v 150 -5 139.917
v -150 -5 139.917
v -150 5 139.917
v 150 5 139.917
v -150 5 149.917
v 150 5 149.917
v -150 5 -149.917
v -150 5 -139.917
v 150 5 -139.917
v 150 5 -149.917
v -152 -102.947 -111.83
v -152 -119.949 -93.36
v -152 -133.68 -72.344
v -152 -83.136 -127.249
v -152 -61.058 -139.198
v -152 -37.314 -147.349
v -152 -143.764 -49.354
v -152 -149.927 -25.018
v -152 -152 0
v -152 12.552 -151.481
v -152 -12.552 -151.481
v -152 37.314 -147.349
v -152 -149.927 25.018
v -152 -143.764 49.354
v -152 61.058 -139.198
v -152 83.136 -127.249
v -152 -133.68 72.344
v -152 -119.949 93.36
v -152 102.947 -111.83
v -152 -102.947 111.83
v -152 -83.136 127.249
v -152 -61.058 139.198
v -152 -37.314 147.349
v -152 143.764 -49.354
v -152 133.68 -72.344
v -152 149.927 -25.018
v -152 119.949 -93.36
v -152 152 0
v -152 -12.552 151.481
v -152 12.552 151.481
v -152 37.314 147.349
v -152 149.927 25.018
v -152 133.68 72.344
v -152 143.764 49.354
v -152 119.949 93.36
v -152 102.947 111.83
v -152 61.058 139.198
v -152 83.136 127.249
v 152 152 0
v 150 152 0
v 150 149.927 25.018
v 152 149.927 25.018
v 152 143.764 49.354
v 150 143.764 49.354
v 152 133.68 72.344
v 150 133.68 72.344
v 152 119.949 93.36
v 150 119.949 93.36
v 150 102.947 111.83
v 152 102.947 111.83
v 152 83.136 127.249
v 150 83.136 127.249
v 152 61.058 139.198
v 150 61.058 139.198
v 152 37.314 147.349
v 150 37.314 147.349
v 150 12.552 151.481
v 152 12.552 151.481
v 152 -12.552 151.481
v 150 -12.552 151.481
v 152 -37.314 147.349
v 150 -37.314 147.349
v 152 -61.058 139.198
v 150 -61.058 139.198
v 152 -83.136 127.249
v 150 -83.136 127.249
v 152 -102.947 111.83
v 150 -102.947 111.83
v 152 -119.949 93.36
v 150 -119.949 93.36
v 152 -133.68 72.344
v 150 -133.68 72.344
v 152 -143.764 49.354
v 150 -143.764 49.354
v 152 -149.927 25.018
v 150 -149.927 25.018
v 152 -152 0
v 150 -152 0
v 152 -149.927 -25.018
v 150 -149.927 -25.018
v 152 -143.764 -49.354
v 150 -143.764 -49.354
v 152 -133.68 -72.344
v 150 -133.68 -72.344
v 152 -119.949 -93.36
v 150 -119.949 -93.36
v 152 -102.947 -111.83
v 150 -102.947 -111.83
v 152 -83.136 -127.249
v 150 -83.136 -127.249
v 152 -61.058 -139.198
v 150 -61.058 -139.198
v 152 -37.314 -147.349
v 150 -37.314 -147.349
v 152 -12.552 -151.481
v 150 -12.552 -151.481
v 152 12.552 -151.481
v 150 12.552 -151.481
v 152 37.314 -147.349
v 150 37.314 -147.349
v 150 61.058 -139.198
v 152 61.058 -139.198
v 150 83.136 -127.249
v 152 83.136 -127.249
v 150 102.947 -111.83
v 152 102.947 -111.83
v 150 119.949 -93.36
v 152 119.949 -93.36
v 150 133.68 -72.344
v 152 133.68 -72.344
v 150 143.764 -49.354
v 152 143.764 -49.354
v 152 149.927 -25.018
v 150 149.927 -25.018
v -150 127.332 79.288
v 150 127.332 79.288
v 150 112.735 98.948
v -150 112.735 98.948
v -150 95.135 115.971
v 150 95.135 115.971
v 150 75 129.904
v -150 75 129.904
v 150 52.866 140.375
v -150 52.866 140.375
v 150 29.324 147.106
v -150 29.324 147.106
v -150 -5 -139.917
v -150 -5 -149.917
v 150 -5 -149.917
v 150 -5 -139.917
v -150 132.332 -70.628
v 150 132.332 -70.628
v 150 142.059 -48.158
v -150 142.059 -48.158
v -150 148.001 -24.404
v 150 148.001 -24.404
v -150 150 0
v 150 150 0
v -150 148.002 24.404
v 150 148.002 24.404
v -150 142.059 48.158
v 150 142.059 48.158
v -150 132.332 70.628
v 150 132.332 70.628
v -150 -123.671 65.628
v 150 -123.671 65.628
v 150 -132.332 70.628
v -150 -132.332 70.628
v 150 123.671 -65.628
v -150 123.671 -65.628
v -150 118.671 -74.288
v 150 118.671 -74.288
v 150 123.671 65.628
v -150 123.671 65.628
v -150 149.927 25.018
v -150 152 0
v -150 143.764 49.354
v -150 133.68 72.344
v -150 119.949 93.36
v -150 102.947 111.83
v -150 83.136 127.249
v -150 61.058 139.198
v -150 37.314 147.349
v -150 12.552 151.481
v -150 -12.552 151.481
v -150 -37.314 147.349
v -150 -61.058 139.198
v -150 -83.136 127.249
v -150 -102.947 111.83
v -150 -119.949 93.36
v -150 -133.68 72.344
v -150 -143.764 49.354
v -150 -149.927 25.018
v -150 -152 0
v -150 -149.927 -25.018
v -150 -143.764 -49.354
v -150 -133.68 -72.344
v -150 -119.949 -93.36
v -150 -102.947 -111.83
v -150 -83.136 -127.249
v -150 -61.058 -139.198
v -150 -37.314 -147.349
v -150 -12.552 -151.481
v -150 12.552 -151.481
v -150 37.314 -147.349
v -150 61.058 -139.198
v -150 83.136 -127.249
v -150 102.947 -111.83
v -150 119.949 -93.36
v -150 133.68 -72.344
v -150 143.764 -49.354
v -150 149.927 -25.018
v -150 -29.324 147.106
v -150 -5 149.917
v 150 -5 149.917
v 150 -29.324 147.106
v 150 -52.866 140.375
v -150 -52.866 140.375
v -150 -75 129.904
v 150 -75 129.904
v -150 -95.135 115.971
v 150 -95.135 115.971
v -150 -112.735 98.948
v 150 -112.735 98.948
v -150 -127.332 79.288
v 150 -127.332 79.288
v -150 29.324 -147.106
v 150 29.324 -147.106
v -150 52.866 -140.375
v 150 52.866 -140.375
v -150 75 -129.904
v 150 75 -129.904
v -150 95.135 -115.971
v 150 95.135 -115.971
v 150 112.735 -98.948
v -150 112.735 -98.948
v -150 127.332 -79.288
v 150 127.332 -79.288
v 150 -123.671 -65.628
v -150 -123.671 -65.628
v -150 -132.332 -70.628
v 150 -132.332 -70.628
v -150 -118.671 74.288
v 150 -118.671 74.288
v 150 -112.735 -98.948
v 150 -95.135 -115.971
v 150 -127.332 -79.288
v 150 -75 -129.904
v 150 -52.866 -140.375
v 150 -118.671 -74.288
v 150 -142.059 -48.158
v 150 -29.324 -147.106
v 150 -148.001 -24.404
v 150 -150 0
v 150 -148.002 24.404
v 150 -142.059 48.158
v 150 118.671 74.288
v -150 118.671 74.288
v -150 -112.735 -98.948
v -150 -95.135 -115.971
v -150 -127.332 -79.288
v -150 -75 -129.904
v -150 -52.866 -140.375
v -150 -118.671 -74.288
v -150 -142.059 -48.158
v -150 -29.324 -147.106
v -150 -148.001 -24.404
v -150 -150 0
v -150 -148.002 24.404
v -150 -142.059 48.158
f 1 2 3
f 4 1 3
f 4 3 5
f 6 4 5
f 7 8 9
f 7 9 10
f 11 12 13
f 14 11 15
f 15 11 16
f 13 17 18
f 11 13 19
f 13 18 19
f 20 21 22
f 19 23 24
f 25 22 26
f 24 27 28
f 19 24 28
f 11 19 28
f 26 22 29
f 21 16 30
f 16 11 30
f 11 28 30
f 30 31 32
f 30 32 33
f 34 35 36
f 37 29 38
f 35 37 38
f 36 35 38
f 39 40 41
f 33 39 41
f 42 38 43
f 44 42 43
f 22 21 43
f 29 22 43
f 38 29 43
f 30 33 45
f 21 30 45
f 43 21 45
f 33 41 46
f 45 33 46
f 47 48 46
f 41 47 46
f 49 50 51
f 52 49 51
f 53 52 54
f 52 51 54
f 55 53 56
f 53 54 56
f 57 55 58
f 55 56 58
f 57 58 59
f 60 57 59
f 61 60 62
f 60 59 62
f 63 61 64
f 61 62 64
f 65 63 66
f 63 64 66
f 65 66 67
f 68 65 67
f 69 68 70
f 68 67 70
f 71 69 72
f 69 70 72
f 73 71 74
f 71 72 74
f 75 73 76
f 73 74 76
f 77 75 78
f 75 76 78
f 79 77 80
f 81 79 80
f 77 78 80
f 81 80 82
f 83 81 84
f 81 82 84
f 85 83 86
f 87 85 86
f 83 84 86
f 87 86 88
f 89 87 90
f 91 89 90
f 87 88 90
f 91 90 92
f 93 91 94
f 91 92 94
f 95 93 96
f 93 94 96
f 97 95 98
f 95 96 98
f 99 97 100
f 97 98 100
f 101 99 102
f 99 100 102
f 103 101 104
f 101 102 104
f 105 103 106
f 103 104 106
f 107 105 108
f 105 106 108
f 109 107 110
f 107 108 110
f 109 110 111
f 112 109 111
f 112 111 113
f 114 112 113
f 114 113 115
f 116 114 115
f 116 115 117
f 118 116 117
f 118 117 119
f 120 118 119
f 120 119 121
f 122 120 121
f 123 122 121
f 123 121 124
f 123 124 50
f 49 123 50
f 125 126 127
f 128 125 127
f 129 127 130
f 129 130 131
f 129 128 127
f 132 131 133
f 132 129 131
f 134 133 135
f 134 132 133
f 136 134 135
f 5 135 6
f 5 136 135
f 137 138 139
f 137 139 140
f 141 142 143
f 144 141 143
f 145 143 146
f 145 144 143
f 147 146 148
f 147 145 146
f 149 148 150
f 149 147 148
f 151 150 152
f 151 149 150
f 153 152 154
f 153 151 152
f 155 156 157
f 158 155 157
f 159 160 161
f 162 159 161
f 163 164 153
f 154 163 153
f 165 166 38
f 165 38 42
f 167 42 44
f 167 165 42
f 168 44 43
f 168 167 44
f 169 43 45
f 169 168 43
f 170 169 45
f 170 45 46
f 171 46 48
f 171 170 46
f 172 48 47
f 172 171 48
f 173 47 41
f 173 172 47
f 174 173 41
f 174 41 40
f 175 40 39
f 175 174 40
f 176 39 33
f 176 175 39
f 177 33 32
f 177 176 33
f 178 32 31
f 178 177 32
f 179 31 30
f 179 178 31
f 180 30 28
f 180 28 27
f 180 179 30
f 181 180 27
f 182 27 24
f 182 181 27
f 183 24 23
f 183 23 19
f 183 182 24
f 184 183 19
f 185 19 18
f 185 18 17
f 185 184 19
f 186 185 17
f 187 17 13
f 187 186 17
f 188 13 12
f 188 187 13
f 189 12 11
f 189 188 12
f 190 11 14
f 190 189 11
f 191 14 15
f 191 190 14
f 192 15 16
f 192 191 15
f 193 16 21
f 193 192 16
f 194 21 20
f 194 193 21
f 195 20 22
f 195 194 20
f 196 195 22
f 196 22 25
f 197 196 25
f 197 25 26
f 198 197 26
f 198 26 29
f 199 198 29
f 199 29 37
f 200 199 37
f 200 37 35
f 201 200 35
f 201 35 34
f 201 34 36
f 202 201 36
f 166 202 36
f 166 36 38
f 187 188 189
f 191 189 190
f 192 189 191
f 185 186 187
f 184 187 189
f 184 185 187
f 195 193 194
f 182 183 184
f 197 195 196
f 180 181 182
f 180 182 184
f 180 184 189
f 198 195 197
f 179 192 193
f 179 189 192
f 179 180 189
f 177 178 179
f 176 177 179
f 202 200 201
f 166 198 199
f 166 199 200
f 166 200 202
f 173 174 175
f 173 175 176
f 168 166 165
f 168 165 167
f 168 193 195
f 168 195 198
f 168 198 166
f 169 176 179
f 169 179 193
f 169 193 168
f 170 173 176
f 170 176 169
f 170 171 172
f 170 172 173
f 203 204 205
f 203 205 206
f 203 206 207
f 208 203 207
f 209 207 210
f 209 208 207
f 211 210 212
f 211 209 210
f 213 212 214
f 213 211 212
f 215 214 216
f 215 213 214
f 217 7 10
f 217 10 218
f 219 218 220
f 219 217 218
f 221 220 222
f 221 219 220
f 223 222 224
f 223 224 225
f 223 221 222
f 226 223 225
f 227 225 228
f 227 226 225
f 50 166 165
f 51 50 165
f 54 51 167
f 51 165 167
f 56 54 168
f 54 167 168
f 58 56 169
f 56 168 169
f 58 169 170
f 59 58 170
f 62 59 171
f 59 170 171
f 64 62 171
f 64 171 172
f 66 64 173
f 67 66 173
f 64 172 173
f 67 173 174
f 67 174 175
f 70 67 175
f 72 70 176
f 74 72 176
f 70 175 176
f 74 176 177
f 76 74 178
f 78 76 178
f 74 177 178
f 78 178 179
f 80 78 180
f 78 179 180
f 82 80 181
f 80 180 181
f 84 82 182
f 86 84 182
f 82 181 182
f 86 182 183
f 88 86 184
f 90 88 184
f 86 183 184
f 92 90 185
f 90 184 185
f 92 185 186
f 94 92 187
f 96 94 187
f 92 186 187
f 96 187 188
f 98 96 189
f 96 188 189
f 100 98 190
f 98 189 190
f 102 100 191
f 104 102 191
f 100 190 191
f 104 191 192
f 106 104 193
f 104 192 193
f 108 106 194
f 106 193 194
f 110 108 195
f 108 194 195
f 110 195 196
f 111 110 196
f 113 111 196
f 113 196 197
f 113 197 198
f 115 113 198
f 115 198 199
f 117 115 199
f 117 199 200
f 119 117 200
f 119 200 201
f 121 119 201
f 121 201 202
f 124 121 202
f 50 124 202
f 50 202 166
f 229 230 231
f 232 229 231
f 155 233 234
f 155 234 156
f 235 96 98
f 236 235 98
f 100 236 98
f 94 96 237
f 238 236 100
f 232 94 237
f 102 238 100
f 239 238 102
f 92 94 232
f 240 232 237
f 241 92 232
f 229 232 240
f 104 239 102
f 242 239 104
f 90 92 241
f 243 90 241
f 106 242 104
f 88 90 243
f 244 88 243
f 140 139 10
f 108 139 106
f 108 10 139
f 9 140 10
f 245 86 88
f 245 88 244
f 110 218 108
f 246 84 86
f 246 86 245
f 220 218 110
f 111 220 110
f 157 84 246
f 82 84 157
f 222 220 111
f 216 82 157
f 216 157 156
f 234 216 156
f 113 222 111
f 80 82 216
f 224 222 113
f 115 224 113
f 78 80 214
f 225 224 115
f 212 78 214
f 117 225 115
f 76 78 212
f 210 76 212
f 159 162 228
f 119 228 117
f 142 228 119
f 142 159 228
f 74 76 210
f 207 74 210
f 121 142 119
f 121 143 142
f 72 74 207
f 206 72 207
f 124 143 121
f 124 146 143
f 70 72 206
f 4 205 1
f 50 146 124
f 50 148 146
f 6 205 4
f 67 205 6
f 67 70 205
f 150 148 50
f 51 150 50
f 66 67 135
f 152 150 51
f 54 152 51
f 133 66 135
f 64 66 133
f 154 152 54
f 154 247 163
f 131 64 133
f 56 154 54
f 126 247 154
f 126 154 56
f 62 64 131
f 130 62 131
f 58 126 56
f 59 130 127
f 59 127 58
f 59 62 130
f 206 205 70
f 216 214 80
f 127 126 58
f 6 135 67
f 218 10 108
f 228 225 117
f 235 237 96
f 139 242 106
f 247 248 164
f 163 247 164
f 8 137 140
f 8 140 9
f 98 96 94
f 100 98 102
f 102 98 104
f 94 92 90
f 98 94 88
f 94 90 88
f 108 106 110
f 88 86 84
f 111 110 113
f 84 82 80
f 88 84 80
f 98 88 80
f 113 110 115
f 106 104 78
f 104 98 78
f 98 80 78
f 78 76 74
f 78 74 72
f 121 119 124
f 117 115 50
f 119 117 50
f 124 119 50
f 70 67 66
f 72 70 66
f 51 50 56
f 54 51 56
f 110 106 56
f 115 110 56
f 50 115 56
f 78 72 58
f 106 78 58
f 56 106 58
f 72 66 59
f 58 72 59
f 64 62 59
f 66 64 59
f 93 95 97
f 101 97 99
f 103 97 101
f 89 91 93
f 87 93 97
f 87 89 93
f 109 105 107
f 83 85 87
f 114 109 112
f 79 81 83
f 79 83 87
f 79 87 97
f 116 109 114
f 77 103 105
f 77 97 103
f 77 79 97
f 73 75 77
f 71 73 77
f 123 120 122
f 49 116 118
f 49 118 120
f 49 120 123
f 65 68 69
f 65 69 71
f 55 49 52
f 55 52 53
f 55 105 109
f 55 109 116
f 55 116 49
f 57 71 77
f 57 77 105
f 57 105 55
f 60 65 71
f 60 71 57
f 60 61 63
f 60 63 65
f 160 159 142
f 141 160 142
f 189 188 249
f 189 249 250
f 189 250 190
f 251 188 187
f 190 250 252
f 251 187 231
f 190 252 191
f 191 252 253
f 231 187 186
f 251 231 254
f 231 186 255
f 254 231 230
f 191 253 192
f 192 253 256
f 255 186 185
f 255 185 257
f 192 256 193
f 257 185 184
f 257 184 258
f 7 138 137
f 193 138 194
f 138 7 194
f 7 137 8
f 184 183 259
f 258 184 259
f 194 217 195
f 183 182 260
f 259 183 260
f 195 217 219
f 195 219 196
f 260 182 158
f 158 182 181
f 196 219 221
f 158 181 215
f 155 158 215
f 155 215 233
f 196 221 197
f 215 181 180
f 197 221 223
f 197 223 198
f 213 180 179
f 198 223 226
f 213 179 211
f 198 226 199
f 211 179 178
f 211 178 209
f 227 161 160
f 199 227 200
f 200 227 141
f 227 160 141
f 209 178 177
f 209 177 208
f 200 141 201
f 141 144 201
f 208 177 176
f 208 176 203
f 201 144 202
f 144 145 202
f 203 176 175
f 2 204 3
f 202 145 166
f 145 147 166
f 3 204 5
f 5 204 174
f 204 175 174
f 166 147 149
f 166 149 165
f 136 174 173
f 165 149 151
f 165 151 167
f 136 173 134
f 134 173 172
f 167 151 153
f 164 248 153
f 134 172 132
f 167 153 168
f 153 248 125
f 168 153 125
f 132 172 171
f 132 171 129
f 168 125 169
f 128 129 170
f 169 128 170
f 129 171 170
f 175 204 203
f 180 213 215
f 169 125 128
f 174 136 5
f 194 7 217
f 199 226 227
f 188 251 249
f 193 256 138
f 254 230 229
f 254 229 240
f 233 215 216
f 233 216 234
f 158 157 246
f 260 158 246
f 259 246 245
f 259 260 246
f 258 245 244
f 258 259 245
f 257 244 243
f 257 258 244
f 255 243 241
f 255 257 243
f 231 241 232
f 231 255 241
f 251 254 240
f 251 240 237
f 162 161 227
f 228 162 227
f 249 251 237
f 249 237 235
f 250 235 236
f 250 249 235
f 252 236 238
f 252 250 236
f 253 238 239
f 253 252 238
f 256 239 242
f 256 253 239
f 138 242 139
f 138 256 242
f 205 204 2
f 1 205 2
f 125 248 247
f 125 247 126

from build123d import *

# Parameters (mm, degrees)
SKETCH_R     = 152
PAD_DEPTH    = 2
SKETCH001_R  = 152
PAD001_DEPTH = 2
SKETCH002_R  = 152
PAD002_DEPTH = 300


with BuildPart() as pad:
    # Sketch → Pad (new body)
    with BuildSketch(Plane.YZ.offset(-150)):
        Circle(SKETCH_R)
    extrude(amount=-PAD_DEPTH)


with BuildPart() as pad001:
    # Sketch001 → Pad001 (new body)
    with BuildSketch(Plane.YZ.offset(150)):
        Circle(SKETCH001_R)
    extrude(amount=PAD001_DEPTH)


with BuildPart() as pad002:
    # Sketch002 → Pad002 (new body)
    with BuildSketch(Plane.YZ.offset(-150)):
        Circle(SKETCH002_R)
        with BuildLine():
            ThreePointArc((-5, 149.916644), (-75.000007, 129.903807), (-127.33163, 79.288436))
            Line((-127.33163, 79.288436), (-118.671374, 74.288439))
            Line((-118.671374, 74.288439), (-123.671373, 65.628185))
            Line((-123.671373, 65.628185), (-132.331629, 70.628181))
            ThreePointArc((-132.331629, 70.628181), (-150, -2.3e-05), (-132.331607, -70.628222))
            Line((-123.671356, -65.628217), (-132.331607, -70.628222))
            Line((-123.671356, -65.628217), (-118.671354, -74.28847))
            Line((-118.671354, -74.28847), (-127.331605, -79.288475))
            ThreePointArc((-127.331605, -79.288475), (-74.999987, -129.903818), (-5, -149.916644))
            Line((-5, -149.916644), (-5, -139.916644))
            Line((-5, -139.916644), (5, -139.916644))
            Line((5, -139.916644), (5, -149.916644))
            ThreePointArc((5, -149.916644), (74.999987, -129.903818), (127.331605, -79.288475))
            Line((118.671351, -74.288476), (127.331605, -79.288475))
            Line((123.671353, -65.628223), (118.671351, -74.288476))
            Line((123.671353, -65.628223), (132.331607, -70.628222))
            ThreePointArc((132.331607, -70.628222), (150, -2.3e-05), (132.331629, 70.628181))
            Line((123.671376, 65.628179), (132.331629, 70.628181))
            Line((118.671377, 74.288434), (123.671376, 65.628179))
            Line((118.671377, 74.288434), (127.33163, 79.288436))
            ThreePointArc((127.33163, 79.288436), (75.000007, 129.903807), (5, 149.916644))
            Line((5, 139.916644), (5, 149.916644))
            Line((-5, 139.916644), (5, 139.916644))
            Line((-5, 149.916644), (-5, 139.916644))
        make_face(mode=Mode.SUBTRACT)
    extrude(amount=PAD002_DEPTH)


solid = Compound([pad.part, pad001.part, pad002.part])
